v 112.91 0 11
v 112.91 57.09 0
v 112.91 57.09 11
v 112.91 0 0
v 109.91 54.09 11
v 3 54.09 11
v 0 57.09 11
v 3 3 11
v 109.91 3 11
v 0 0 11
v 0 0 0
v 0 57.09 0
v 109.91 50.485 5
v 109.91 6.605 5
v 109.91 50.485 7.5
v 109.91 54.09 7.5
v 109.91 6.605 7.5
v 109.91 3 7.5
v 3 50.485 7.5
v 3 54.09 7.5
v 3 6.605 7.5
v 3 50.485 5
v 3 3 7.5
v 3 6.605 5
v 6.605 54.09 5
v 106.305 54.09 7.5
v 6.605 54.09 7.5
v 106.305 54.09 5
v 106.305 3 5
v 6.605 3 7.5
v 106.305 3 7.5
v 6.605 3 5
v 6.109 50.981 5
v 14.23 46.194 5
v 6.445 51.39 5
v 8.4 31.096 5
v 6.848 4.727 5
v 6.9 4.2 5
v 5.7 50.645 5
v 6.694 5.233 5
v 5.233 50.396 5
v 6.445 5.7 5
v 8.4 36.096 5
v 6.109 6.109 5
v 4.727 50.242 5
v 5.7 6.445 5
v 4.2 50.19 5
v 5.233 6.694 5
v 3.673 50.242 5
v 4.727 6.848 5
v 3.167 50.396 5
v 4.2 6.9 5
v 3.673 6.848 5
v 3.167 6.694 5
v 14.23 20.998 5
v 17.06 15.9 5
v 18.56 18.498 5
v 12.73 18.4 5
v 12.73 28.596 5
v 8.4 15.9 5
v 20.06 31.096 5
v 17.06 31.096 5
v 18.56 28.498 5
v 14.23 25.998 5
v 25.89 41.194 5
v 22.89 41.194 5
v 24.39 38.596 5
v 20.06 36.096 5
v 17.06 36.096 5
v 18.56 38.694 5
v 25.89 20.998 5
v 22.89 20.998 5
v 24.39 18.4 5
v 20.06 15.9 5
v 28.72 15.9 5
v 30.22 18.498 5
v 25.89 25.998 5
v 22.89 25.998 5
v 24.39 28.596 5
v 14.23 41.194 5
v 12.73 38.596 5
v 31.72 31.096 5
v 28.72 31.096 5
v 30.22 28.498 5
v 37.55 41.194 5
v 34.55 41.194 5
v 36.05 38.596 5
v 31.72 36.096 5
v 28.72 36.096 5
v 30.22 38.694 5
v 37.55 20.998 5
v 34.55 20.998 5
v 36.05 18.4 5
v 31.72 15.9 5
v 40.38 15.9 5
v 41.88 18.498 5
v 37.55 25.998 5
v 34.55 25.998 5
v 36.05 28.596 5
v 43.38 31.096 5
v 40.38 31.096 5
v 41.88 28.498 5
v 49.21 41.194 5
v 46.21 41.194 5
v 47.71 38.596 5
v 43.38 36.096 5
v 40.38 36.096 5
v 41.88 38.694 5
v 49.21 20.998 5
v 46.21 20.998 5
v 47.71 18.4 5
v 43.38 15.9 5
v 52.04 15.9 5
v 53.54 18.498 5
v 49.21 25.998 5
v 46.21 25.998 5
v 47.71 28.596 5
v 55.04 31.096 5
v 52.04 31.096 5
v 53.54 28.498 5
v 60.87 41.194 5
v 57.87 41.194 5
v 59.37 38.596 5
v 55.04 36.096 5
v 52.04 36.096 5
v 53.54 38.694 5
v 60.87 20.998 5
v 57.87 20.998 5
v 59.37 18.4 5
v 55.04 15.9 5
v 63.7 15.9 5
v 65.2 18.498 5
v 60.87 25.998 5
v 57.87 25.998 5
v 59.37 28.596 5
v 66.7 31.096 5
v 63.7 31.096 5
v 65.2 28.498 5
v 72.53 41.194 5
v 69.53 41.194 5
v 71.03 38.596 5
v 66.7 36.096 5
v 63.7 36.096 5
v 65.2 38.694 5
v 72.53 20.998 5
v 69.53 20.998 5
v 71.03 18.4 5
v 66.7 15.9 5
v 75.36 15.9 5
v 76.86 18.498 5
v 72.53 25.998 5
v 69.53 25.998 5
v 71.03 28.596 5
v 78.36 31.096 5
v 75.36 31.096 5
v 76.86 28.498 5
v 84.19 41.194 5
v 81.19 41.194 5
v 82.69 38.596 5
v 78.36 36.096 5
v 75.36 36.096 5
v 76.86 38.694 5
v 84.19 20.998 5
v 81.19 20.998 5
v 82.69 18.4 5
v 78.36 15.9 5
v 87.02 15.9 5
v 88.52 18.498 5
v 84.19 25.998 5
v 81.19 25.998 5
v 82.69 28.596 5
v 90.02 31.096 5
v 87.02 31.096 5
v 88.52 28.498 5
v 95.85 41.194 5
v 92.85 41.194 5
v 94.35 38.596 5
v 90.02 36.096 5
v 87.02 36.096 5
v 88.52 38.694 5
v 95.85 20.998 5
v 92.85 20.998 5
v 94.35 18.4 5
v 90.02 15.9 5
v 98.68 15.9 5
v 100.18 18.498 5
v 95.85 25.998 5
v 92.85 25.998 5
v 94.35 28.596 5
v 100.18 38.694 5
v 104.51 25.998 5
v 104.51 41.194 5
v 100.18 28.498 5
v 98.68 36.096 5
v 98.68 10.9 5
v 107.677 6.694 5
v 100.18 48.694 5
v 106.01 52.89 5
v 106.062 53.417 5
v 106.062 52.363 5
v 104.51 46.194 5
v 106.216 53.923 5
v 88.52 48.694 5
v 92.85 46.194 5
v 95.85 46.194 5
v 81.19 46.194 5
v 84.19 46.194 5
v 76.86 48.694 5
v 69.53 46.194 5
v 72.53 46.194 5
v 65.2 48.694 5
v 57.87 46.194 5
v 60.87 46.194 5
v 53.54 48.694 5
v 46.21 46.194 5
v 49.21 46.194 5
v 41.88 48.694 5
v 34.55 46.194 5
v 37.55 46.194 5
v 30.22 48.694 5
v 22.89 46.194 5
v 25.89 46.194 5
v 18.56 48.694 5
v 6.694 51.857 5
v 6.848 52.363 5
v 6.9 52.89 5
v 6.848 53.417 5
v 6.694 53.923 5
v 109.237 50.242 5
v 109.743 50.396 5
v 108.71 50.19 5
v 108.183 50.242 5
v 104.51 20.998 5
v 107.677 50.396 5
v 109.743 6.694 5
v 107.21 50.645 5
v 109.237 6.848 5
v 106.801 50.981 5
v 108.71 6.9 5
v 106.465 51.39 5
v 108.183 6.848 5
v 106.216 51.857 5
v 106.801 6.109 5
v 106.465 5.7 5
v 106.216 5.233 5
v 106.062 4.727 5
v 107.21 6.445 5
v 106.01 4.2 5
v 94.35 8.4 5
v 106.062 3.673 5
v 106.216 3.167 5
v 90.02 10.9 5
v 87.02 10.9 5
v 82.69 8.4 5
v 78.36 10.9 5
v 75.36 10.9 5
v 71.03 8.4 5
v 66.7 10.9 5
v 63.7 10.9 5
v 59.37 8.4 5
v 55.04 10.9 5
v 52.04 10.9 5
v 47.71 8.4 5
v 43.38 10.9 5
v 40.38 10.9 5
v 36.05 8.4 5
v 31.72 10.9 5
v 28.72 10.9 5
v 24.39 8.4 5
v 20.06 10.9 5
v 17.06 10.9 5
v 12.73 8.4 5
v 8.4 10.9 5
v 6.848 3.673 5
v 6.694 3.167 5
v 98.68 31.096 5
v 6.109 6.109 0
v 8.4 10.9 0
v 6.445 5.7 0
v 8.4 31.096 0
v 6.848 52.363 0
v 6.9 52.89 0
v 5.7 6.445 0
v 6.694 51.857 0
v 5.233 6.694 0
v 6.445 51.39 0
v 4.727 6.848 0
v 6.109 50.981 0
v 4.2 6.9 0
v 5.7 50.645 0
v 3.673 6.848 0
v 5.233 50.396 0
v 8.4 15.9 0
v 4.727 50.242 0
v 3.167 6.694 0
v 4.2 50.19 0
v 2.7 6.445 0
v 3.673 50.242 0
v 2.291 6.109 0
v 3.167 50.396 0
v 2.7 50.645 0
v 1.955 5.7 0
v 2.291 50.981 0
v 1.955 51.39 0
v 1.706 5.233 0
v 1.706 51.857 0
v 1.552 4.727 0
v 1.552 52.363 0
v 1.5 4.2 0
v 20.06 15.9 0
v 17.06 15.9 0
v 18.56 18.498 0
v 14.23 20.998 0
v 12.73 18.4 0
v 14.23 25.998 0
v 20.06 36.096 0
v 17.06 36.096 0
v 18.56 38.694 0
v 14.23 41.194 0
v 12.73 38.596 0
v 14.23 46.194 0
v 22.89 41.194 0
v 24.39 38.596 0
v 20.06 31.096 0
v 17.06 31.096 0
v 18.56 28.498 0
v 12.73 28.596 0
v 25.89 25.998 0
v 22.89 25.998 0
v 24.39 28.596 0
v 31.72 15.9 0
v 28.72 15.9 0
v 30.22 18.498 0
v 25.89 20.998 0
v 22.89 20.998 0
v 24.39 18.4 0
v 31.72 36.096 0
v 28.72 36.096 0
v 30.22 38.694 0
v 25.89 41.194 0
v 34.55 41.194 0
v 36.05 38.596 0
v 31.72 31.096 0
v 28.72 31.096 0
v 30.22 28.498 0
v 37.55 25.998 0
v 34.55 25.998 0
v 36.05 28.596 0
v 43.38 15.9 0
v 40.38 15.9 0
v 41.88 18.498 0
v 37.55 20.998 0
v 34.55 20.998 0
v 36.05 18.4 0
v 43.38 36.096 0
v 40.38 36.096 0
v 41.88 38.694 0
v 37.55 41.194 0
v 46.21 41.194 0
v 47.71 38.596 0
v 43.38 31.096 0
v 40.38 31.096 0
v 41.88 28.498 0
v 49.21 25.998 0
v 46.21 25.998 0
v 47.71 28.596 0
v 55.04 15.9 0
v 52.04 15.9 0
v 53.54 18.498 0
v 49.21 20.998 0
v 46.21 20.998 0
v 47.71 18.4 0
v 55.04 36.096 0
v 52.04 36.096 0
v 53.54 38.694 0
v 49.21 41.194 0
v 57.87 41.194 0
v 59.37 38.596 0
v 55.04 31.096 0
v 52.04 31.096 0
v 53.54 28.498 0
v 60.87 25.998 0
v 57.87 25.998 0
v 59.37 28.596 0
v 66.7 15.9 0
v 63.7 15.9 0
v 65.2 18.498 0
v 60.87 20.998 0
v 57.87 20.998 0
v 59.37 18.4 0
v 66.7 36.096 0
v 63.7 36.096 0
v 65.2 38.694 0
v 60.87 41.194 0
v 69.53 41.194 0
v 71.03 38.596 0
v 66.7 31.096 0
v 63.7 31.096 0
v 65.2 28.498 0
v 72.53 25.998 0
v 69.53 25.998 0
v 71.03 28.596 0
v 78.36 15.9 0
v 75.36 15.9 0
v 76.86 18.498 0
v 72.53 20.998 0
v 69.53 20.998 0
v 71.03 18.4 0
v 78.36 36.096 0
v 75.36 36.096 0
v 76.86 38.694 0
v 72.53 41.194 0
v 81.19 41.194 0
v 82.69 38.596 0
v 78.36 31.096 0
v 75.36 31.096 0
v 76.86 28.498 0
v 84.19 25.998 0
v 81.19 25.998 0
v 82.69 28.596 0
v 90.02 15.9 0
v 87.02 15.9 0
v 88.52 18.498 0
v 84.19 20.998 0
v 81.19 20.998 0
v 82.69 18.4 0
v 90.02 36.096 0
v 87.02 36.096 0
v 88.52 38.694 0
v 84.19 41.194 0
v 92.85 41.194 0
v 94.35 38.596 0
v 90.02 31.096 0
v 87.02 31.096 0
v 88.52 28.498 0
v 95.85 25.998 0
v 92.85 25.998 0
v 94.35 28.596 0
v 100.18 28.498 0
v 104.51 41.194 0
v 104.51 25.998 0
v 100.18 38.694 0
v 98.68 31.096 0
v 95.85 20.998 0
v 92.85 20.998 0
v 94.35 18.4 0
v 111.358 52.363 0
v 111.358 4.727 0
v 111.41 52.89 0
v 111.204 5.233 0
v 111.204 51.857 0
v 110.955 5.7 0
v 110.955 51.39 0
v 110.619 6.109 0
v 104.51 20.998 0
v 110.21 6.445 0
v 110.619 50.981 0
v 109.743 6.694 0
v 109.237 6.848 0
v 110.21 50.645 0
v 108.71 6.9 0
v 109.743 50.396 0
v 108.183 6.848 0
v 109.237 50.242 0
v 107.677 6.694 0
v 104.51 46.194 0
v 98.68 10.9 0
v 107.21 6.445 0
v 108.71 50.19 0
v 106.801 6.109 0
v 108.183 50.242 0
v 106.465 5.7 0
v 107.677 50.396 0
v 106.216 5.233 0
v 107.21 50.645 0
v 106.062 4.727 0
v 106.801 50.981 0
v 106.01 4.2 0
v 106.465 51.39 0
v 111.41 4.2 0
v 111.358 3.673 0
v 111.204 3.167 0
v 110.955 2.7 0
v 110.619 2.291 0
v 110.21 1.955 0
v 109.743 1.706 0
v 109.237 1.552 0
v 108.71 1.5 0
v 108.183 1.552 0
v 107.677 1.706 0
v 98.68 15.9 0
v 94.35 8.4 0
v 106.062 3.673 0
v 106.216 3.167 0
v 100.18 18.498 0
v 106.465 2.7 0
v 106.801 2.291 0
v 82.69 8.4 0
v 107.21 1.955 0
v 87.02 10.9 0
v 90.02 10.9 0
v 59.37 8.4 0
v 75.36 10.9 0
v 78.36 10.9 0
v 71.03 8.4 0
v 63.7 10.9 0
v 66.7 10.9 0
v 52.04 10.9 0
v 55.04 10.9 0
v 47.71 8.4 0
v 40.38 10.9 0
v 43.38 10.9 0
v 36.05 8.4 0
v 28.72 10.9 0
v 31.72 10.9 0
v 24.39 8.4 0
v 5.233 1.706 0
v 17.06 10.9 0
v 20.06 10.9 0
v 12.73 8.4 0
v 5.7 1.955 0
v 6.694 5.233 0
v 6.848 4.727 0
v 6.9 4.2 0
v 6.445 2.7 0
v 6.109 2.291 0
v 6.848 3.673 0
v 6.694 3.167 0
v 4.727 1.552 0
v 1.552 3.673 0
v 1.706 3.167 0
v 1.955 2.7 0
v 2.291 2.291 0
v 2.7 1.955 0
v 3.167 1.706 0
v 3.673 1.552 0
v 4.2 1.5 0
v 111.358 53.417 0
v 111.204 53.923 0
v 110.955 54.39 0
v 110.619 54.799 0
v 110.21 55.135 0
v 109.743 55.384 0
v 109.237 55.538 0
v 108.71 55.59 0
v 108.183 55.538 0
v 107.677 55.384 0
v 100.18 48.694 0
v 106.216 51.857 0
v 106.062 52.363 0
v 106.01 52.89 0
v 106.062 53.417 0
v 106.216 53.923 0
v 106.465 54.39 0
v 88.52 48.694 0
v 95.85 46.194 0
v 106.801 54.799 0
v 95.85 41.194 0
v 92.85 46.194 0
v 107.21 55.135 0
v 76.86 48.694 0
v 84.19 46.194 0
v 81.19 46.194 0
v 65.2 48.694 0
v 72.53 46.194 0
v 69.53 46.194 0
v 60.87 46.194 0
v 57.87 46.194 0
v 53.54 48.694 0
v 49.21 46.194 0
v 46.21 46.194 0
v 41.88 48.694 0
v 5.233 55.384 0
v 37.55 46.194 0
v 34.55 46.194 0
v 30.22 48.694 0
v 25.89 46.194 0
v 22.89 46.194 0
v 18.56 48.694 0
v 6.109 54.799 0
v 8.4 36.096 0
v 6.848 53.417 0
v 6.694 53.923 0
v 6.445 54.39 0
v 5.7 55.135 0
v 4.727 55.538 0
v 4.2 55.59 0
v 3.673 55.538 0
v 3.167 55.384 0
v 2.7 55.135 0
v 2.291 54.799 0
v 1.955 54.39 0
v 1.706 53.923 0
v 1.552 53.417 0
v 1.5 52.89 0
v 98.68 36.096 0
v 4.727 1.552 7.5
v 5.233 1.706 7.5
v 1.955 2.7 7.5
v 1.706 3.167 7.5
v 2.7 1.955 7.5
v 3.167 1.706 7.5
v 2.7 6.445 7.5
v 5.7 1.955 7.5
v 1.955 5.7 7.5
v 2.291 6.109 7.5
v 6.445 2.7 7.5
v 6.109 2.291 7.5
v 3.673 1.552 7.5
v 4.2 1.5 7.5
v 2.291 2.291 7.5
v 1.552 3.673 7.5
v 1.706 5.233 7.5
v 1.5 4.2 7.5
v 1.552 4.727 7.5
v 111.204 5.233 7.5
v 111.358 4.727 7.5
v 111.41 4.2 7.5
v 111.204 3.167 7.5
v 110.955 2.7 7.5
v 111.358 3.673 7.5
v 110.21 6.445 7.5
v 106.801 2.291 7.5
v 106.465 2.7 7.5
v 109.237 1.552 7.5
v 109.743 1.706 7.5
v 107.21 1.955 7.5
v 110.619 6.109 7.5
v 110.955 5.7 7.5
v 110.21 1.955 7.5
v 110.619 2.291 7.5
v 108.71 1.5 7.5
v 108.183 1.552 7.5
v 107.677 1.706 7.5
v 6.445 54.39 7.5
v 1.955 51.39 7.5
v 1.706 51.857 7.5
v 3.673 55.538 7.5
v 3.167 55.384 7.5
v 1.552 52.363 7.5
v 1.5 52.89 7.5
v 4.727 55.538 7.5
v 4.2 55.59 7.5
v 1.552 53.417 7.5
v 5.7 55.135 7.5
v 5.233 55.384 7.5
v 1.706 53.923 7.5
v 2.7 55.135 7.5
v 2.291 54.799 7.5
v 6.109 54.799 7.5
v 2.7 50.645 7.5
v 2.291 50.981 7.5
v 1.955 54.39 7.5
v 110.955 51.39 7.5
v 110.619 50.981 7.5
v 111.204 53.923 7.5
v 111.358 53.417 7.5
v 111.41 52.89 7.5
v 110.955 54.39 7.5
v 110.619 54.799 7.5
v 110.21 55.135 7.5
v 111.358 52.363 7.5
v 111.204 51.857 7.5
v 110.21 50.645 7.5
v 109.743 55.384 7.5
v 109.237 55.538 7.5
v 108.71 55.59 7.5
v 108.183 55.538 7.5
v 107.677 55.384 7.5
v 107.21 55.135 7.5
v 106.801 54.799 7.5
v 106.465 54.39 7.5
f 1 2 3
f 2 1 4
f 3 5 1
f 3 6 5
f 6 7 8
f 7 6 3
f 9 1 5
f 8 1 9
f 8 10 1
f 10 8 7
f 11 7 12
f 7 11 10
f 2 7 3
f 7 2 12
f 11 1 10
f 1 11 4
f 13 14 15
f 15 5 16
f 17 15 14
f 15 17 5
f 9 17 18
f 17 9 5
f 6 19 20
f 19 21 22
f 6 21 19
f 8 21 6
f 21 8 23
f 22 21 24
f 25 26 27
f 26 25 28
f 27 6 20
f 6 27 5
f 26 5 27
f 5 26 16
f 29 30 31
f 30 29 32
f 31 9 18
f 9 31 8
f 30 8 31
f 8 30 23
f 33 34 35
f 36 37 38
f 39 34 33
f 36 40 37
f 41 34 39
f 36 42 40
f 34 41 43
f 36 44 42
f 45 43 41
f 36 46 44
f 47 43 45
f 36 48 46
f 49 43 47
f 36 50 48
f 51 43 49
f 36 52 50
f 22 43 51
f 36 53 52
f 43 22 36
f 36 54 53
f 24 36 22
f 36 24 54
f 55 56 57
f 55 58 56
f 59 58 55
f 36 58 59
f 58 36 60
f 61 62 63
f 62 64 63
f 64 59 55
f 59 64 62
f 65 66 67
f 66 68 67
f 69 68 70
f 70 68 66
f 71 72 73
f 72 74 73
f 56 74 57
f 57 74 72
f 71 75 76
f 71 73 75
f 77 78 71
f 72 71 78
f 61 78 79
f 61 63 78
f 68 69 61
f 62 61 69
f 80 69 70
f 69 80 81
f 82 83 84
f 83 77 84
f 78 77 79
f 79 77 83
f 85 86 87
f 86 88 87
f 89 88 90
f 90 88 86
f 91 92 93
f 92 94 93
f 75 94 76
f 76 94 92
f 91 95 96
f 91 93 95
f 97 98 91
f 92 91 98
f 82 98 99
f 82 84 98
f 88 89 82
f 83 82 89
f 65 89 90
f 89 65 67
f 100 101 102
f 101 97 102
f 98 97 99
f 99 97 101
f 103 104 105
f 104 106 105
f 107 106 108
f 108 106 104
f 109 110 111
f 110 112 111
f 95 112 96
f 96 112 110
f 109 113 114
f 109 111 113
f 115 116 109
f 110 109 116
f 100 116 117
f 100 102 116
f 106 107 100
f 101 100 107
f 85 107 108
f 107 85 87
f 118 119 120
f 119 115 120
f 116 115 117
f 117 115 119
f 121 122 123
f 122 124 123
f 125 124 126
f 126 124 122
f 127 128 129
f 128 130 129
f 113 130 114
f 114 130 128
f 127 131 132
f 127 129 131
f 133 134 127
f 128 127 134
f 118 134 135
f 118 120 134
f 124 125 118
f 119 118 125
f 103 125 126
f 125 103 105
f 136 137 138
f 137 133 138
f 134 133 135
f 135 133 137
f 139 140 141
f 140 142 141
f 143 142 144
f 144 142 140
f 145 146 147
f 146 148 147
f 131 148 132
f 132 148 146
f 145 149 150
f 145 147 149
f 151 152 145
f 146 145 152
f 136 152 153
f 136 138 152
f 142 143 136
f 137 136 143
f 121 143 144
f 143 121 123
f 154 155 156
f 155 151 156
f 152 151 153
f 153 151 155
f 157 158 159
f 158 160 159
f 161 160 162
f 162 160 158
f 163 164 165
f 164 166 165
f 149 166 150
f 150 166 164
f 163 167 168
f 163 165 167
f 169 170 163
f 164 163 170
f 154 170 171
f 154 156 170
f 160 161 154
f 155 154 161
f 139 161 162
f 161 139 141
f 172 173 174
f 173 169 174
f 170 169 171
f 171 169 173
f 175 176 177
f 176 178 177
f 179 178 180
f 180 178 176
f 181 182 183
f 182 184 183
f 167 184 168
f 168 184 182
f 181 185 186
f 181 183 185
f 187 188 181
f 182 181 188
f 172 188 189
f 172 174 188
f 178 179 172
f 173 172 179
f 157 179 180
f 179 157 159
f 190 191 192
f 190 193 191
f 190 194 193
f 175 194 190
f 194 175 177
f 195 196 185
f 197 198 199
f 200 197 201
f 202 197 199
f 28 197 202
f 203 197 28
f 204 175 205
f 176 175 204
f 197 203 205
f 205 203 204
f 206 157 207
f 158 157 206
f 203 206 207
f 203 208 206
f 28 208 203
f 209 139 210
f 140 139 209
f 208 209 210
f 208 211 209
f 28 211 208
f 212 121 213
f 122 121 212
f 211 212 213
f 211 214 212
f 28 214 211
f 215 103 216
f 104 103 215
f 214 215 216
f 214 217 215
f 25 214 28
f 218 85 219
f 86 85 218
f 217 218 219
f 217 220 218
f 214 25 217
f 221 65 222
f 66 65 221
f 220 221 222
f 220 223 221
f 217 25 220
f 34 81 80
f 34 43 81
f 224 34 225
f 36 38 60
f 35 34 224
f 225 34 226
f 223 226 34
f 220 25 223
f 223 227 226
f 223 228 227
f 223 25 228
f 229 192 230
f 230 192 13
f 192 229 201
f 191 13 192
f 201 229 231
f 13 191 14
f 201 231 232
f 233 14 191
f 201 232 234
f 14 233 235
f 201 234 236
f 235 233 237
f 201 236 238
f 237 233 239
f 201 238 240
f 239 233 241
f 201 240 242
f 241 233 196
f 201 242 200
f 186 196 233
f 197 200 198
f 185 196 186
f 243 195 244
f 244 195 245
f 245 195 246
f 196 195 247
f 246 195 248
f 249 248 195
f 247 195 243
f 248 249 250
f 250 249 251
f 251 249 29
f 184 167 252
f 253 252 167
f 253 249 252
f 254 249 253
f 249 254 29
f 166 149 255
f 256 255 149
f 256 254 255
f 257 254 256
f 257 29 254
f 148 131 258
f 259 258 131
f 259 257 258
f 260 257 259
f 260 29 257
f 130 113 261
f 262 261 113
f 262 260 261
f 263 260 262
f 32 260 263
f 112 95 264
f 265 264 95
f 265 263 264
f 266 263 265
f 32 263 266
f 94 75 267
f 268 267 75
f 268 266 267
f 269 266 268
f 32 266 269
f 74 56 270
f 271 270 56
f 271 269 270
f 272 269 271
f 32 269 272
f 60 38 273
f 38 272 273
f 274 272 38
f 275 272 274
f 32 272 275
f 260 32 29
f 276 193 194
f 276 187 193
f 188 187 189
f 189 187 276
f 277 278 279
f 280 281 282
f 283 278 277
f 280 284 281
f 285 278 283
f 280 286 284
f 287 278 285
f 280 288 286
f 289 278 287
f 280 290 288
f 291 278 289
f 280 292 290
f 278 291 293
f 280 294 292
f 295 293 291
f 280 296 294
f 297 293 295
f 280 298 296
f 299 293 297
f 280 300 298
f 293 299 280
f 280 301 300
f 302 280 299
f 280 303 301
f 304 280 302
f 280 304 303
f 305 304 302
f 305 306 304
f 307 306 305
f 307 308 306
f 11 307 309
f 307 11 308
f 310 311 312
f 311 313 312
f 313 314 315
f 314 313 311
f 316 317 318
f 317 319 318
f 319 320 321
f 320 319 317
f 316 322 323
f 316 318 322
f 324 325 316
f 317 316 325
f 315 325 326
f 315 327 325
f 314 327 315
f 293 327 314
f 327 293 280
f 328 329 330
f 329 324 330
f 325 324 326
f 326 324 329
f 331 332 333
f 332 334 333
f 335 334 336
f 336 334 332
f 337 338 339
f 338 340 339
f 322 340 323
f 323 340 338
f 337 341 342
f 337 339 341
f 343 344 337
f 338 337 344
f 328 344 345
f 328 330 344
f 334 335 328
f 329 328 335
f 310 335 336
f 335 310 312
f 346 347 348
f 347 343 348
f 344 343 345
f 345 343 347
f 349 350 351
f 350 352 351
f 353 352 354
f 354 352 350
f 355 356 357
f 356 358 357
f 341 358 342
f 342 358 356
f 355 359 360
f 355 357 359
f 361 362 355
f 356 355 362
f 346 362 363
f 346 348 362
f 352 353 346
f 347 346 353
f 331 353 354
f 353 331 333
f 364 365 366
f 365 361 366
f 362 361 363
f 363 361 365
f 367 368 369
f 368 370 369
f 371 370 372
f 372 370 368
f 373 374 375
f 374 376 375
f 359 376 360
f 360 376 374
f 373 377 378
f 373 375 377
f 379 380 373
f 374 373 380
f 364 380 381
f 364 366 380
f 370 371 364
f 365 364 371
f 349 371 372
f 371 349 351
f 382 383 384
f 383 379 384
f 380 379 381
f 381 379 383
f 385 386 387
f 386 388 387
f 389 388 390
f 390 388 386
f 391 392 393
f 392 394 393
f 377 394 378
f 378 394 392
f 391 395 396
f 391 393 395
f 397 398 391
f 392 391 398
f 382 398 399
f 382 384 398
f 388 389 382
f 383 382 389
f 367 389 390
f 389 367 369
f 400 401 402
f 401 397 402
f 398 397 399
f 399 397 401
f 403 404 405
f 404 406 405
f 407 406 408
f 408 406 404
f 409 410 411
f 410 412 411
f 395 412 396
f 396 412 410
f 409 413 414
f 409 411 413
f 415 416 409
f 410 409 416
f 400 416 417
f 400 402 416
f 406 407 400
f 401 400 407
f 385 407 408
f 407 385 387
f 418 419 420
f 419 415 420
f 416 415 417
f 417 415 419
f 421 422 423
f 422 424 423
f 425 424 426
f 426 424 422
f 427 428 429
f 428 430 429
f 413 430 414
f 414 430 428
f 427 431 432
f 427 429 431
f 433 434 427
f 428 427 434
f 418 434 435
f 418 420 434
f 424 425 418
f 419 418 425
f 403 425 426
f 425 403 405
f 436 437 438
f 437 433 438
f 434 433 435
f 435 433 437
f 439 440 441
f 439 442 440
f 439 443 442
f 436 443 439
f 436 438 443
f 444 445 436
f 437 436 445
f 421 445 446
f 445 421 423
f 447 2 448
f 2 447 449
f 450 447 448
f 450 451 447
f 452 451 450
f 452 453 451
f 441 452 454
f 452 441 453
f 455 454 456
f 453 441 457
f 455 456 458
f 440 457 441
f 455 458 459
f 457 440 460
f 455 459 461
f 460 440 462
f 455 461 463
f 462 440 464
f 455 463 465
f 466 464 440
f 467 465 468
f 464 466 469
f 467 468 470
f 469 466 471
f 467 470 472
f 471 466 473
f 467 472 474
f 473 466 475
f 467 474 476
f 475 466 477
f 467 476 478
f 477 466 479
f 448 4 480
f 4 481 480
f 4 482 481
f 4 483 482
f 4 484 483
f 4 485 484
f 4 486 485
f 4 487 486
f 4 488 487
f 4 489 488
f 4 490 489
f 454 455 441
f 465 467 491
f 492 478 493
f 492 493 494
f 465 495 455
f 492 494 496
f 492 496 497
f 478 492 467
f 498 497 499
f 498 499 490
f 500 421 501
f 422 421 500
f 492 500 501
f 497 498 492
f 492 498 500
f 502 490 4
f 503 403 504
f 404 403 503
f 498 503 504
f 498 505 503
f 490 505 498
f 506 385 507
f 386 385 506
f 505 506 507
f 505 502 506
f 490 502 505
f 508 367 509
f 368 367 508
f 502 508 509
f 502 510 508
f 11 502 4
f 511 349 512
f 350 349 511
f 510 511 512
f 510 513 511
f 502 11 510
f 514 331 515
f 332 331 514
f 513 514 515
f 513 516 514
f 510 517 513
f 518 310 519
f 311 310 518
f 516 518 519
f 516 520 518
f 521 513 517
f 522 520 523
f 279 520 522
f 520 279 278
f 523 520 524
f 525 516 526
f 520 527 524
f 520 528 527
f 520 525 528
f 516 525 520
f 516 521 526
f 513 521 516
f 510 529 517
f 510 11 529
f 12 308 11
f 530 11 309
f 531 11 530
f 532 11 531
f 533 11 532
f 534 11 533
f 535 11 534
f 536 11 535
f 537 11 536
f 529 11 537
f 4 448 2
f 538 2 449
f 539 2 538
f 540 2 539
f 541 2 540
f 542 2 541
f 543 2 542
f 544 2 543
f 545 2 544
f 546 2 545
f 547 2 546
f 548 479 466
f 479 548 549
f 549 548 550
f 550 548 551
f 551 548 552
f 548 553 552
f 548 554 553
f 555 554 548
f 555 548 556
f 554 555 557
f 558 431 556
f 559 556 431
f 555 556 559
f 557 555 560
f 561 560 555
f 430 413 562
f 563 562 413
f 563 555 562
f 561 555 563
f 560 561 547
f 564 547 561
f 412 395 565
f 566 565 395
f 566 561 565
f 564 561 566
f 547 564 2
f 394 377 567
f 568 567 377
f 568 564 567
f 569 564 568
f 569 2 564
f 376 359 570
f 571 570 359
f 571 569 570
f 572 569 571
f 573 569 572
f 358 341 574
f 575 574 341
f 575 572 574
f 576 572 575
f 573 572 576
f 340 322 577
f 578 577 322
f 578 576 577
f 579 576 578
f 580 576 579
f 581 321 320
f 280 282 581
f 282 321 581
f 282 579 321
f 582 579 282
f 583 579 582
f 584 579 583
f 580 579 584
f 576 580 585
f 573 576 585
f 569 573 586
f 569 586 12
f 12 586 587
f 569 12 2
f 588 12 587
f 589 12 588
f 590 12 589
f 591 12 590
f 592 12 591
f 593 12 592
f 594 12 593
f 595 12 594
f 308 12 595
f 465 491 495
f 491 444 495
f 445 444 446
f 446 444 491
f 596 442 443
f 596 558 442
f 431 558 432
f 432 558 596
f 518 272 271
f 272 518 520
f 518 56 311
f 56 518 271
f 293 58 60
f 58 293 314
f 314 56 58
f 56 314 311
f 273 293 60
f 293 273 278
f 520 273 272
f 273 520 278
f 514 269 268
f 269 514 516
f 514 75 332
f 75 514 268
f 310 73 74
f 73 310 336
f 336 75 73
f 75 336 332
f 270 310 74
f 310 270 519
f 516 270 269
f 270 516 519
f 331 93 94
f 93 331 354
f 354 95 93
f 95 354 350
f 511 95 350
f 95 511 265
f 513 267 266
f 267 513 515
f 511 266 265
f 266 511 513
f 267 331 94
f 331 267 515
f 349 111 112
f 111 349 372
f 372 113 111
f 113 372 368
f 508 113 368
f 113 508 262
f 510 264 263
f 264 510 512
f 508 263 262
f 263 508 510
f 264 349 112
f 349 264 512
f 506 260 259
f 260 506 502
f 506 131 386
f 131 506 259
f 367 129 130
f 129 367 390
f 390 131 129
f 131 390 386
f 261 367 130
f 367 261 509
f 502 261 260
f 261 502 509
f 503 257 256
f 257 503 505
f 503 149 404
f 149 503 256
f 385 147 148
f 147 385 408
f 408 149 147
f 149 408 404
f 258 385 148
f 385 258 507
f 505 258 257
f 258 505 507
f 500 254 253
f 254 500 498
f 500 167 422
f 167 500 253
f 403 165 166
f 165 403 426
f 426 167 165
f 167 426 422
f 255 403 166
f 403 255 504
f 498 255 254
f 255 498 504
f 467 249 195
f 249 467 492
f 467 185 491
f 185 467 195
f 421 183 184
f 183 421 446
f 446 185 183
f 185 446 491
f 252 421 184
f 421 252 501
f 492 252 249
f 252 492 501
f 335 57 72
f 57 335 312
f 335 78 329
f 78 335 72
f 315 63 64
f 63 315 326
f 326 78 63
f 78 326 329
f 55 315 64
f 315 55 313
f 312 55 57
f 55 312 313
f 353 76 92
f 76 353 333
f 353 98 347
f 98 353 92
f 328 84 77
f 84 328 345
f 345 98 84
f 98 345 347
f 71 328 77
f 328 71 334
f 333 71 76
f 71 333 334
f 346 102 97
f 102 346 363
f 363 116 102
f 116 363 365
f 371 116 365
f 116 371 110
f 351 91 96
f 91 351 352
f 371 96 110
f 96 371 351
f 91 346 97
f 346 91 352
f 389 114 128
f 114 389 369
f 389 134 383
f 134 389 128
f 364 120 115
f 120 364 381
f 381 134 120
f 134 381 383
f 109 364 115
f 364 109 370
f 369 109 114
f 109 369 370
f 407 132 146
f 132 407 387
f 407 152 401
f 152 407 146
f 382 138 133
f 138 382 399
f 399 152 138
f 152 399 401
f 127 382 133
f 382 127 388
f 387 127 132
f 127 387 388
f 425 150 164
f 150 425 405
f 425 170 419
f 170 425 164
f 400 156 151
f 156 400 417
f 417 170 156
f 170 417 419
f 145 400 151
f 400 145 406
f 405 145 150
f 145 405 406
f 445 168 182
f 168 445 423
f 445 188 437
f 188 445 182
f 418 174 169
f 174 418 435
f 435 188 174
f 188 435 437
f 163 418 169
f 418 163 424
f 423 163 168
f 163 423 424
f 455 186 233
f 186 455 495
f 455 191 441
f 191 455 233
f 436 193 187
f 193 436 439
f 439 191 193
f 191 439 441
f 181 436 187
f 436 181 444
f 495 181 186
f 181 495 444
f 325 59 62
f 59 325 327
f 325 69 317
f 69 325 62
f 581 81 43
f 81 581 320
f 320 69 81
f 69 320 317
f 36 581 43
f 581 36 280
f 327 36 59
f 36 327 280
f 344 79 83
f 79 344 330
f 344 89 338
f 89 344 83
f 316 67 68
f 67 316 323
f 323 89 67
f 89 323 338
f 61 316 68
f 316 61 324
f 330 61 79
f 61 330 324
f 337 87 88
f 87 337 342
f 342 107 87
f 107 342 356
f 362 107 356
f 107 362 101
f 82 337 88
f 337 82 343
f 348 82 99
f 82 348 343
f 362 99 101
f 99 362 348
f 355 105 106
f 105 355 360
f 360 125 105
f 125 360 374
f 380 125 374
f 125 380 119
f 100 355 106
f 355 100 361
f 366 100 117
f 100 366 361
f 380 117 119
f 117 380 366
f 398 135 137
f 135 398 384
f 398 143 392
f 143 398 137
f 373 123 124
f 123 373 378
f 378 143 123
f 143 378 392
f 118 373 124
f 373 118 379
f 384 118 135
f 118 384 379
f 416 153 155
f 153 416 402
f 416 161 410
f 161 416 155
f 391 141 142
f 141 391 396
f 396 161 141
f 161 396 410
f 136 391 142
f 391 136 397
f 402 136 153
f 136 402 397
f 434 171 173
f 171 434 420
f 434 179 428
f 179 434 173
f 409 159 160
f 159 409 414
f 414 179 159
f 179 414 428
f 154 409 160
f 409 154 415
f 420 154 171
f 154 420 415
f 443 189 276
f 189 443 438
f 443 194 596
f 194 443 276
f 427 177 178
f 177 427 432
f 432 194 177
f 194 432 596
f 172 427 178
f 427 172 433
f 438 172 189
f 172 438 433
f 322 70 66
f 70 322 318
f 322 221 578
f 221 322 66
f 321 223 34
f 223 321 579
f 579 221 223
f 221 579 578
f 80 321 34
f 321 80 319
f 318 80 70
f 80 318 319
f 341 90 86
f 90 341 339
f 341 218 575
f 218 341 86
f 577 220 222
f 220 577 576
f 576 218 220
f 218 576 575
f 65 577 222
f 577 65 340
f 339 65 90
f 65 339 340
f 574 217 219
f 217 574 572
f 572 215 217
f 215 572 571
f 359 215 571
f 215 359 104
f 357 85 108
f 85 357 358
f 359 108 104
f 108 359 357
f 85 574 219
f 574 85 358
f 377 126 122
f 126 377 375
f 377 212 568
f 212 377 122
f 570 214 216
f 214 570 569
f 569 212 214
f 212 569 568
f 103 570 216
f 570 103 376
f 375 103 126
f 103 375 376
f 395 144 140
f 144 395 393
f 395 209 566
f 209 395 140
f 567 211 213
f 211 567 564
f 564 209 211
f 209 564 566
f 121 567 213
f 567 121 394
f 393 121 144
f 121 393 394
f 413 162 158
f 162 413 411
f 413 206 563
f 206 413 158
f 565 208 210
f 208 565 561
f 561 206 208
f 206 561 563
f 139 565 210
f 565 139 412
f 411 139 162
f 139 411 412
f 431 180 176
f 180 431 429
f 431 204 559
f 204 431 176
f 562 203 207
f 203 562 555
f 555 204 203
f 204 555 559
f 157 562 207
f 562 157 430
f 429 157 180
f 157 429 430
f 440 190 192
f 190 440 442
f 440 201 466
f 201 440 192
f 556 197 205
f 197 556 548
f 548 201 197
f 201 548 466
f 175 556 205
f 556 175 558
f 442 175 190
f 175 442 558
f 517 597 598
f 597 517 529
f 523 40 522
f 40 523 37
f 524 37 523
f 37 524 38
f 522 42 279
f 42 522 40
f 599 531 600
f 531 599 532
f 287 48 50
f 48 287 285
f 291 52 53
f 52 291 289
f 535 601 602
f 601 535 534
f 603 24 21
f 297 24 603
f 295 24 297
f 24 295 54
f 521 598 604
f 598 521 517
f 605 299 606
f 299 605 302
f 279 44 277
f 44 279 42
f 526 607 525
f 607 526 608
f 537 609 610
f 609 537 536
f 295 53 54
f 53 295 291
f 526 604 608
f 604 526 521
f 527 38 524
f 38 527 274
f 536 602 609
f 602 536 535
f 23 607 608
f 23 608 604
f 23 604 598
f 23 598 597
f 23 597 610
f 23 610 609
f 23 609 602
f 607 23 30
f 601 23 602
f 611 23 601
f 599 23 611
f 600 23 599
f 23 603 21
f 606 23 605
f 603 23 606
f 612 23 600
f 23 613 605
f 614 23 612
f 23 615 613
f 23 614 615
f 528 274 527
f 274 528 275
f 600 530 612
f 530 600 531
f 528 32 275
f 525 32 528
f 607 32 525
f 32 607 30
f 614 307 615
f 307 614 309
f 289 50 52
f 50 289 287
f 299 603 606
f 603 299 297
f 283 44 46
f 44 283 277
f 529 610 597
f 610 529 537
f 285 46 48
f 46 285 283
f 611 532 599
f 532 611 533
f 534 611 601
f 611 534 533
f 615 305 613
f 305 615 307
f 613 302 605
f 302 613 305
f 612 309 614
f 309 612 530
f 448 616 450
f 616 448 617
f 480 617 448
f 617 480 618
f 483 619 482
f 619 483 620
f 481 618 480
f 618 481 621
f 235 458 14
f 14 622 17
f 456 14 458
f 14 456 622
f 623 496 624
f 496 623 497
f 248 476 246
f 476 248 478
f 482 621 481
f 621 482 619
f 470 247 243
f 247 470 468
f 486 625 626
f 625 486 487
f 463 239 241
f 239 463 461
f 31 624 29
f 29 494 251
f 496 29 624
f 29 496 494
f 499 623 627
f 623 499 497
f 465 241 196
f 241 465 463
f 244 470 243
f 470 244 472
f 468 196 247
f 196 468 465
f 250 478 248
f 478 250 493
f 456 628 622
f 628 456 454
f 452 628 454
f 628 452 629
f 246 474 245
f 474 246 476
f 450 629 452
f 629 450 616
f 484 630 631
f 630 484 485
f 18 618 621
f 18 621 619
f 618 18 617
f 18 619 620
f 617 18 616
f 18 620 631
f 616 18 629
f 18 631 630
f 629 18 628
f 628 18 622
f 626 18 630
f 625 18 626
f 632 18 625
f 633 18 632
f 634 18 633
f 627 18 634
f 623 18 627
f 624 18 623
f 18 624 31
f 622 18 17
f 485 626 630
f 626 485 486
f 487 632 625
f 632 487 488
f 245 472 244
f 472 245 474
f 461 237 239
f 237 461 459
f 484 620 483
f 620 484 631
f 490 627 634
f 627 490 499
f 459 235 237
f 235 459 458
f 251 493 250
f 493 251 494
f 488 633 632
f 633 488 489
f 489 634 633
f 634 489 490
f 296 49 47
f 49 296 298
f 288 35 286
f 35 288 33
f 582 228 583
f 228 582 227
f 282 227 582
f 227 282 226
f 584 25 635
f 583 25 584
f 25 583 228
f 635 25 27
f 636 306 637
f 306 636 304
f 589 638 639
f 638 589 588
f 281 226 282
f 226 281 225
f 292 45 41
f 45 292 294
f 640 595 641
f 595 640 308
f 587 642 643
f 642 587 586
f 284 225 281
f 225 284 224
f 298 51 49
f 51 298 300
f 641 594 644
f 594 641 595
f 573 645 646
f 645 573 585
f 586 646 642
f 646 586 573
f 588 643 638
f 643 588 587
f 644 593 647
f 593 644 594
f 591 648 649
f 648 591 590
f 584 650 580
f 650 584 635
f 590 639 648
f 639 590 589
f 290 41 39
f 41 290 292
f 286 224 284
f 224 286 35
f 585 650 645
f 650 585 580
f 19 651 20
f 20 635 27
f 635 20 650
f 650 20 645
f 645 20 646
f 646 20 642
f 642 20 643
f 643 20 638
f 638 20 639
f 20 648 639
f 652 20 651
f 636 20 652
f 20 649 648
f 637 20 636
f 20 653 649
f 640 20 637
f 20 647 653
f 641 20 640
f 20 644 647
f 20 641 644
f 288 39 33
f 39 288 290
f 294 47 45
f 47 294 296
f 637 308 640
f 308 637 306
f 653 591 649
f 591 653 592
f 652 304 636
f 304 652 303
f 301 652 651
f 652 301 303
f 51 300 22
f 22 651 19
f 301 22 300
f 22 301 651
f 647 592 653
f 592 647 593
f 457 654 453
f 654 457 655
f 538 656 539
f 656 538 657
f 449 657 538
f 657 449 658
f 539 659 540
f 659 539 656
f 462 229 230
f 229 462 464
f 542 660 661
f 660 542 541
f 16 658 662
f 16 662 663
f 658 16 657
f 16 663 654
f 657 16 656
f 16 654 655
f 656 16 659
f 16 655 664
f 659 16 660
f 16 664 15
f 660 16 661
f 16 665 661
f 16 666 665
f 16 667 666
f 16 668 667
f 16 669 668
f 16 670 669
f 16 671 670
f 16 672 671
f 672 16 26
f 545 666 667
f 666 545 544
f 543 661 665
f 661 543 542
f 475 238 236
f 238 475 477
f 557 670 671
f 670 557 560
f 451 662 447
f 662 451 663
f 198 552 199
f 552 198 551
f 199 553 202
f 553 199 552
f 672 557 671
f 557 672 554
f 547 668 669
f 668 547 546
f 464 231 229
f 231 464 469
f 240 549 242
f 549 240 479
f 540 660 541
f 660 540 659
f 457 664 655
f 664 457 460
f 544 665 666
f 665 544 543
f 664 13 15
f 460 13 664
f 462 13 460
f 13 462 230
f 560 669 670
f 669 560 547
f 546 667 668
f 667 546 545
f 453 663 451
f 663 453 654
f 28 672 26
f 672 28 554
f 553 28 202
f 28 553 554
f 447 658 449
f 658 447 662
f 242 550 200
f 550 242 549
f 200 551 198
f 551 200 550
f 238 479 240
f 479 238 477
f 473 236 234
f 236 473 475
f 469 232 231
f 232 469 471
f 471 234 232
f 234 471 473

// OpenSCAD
$fn = 32;

// ----------------------------------------------------------------------
// Honeycomb panel: 112.91 x 57.09 mm, 32 cells of 10 mm
// ----------------------------------------------------------------------

// --- parameters (mm) ---
panel_w = 112.91;         // panel width
panel_d = 57.09;          // panel depth
thick = 5;                // panel thickness
cell_r = 5;               // hex cell circumradius
pitch = 11.66;            // hex cell pitch (centre to centre)
web = 3;                  // web between the cells
columns = 8;              // columns of cells
rows = 4;                 // rows of cells
cell_count = 32;          // total cells
shift_x = 12.73;          // first cell offset in x
shift_y = 13.4;           // first cell offset in y
mount_d = 5.4;            // corner mounting holes
hole_off = 4.2;           // mounting hole offset from the corners
rim_h = 11;               // rim height
rim_t = 3;                // rim wall thickness

difference() {
  union() {
    cube([panel_w, panel_d, thick]);
    /* rim around the panel, sunk 1 mm into the plate */
    translate([0, 0, thick - 1]) difference() {
      cube([panel_w, panel_d, rim_h - thick + 1]);
      translate([rim_t, rim_t, -2.5]) cube([panel_w - 2 * rim_t, panel_d - 2 * rim_t, rim_h - thick + 6]);
    }
  }
  /* hexagonal cells, point-up, cut right through the plate */
  for (row = [0 : rows - 1]) {
    for (col = [0 : columns - 1]) {
      translate([shift_x + col * pitch + (row % 2) * pitch / 2, shift_y + row * pitch * 0.866025, -2.5]) rotate([0, 0, 30]) cylinder(h = thick + 5, d = 2 * cell_r, $fn = 6);
    }
  }
  /* corner mounting holes, clear of the outer cell web */
  translate([4.2, 4.2, -2.5]) cylinder(h = thick + 5, d = mount_d);
  translate([108.71, 4.2, -2.5]) cylinder(h = thick + 5, d = mount_d);
  translate([4.2, 52.89, -2.5]) cylinder(h = thick + 5, d = mount_d);
  translate([108.71, 52.89, -2.5]) cylinder(h = thick + 5, d = mount_d);
}
